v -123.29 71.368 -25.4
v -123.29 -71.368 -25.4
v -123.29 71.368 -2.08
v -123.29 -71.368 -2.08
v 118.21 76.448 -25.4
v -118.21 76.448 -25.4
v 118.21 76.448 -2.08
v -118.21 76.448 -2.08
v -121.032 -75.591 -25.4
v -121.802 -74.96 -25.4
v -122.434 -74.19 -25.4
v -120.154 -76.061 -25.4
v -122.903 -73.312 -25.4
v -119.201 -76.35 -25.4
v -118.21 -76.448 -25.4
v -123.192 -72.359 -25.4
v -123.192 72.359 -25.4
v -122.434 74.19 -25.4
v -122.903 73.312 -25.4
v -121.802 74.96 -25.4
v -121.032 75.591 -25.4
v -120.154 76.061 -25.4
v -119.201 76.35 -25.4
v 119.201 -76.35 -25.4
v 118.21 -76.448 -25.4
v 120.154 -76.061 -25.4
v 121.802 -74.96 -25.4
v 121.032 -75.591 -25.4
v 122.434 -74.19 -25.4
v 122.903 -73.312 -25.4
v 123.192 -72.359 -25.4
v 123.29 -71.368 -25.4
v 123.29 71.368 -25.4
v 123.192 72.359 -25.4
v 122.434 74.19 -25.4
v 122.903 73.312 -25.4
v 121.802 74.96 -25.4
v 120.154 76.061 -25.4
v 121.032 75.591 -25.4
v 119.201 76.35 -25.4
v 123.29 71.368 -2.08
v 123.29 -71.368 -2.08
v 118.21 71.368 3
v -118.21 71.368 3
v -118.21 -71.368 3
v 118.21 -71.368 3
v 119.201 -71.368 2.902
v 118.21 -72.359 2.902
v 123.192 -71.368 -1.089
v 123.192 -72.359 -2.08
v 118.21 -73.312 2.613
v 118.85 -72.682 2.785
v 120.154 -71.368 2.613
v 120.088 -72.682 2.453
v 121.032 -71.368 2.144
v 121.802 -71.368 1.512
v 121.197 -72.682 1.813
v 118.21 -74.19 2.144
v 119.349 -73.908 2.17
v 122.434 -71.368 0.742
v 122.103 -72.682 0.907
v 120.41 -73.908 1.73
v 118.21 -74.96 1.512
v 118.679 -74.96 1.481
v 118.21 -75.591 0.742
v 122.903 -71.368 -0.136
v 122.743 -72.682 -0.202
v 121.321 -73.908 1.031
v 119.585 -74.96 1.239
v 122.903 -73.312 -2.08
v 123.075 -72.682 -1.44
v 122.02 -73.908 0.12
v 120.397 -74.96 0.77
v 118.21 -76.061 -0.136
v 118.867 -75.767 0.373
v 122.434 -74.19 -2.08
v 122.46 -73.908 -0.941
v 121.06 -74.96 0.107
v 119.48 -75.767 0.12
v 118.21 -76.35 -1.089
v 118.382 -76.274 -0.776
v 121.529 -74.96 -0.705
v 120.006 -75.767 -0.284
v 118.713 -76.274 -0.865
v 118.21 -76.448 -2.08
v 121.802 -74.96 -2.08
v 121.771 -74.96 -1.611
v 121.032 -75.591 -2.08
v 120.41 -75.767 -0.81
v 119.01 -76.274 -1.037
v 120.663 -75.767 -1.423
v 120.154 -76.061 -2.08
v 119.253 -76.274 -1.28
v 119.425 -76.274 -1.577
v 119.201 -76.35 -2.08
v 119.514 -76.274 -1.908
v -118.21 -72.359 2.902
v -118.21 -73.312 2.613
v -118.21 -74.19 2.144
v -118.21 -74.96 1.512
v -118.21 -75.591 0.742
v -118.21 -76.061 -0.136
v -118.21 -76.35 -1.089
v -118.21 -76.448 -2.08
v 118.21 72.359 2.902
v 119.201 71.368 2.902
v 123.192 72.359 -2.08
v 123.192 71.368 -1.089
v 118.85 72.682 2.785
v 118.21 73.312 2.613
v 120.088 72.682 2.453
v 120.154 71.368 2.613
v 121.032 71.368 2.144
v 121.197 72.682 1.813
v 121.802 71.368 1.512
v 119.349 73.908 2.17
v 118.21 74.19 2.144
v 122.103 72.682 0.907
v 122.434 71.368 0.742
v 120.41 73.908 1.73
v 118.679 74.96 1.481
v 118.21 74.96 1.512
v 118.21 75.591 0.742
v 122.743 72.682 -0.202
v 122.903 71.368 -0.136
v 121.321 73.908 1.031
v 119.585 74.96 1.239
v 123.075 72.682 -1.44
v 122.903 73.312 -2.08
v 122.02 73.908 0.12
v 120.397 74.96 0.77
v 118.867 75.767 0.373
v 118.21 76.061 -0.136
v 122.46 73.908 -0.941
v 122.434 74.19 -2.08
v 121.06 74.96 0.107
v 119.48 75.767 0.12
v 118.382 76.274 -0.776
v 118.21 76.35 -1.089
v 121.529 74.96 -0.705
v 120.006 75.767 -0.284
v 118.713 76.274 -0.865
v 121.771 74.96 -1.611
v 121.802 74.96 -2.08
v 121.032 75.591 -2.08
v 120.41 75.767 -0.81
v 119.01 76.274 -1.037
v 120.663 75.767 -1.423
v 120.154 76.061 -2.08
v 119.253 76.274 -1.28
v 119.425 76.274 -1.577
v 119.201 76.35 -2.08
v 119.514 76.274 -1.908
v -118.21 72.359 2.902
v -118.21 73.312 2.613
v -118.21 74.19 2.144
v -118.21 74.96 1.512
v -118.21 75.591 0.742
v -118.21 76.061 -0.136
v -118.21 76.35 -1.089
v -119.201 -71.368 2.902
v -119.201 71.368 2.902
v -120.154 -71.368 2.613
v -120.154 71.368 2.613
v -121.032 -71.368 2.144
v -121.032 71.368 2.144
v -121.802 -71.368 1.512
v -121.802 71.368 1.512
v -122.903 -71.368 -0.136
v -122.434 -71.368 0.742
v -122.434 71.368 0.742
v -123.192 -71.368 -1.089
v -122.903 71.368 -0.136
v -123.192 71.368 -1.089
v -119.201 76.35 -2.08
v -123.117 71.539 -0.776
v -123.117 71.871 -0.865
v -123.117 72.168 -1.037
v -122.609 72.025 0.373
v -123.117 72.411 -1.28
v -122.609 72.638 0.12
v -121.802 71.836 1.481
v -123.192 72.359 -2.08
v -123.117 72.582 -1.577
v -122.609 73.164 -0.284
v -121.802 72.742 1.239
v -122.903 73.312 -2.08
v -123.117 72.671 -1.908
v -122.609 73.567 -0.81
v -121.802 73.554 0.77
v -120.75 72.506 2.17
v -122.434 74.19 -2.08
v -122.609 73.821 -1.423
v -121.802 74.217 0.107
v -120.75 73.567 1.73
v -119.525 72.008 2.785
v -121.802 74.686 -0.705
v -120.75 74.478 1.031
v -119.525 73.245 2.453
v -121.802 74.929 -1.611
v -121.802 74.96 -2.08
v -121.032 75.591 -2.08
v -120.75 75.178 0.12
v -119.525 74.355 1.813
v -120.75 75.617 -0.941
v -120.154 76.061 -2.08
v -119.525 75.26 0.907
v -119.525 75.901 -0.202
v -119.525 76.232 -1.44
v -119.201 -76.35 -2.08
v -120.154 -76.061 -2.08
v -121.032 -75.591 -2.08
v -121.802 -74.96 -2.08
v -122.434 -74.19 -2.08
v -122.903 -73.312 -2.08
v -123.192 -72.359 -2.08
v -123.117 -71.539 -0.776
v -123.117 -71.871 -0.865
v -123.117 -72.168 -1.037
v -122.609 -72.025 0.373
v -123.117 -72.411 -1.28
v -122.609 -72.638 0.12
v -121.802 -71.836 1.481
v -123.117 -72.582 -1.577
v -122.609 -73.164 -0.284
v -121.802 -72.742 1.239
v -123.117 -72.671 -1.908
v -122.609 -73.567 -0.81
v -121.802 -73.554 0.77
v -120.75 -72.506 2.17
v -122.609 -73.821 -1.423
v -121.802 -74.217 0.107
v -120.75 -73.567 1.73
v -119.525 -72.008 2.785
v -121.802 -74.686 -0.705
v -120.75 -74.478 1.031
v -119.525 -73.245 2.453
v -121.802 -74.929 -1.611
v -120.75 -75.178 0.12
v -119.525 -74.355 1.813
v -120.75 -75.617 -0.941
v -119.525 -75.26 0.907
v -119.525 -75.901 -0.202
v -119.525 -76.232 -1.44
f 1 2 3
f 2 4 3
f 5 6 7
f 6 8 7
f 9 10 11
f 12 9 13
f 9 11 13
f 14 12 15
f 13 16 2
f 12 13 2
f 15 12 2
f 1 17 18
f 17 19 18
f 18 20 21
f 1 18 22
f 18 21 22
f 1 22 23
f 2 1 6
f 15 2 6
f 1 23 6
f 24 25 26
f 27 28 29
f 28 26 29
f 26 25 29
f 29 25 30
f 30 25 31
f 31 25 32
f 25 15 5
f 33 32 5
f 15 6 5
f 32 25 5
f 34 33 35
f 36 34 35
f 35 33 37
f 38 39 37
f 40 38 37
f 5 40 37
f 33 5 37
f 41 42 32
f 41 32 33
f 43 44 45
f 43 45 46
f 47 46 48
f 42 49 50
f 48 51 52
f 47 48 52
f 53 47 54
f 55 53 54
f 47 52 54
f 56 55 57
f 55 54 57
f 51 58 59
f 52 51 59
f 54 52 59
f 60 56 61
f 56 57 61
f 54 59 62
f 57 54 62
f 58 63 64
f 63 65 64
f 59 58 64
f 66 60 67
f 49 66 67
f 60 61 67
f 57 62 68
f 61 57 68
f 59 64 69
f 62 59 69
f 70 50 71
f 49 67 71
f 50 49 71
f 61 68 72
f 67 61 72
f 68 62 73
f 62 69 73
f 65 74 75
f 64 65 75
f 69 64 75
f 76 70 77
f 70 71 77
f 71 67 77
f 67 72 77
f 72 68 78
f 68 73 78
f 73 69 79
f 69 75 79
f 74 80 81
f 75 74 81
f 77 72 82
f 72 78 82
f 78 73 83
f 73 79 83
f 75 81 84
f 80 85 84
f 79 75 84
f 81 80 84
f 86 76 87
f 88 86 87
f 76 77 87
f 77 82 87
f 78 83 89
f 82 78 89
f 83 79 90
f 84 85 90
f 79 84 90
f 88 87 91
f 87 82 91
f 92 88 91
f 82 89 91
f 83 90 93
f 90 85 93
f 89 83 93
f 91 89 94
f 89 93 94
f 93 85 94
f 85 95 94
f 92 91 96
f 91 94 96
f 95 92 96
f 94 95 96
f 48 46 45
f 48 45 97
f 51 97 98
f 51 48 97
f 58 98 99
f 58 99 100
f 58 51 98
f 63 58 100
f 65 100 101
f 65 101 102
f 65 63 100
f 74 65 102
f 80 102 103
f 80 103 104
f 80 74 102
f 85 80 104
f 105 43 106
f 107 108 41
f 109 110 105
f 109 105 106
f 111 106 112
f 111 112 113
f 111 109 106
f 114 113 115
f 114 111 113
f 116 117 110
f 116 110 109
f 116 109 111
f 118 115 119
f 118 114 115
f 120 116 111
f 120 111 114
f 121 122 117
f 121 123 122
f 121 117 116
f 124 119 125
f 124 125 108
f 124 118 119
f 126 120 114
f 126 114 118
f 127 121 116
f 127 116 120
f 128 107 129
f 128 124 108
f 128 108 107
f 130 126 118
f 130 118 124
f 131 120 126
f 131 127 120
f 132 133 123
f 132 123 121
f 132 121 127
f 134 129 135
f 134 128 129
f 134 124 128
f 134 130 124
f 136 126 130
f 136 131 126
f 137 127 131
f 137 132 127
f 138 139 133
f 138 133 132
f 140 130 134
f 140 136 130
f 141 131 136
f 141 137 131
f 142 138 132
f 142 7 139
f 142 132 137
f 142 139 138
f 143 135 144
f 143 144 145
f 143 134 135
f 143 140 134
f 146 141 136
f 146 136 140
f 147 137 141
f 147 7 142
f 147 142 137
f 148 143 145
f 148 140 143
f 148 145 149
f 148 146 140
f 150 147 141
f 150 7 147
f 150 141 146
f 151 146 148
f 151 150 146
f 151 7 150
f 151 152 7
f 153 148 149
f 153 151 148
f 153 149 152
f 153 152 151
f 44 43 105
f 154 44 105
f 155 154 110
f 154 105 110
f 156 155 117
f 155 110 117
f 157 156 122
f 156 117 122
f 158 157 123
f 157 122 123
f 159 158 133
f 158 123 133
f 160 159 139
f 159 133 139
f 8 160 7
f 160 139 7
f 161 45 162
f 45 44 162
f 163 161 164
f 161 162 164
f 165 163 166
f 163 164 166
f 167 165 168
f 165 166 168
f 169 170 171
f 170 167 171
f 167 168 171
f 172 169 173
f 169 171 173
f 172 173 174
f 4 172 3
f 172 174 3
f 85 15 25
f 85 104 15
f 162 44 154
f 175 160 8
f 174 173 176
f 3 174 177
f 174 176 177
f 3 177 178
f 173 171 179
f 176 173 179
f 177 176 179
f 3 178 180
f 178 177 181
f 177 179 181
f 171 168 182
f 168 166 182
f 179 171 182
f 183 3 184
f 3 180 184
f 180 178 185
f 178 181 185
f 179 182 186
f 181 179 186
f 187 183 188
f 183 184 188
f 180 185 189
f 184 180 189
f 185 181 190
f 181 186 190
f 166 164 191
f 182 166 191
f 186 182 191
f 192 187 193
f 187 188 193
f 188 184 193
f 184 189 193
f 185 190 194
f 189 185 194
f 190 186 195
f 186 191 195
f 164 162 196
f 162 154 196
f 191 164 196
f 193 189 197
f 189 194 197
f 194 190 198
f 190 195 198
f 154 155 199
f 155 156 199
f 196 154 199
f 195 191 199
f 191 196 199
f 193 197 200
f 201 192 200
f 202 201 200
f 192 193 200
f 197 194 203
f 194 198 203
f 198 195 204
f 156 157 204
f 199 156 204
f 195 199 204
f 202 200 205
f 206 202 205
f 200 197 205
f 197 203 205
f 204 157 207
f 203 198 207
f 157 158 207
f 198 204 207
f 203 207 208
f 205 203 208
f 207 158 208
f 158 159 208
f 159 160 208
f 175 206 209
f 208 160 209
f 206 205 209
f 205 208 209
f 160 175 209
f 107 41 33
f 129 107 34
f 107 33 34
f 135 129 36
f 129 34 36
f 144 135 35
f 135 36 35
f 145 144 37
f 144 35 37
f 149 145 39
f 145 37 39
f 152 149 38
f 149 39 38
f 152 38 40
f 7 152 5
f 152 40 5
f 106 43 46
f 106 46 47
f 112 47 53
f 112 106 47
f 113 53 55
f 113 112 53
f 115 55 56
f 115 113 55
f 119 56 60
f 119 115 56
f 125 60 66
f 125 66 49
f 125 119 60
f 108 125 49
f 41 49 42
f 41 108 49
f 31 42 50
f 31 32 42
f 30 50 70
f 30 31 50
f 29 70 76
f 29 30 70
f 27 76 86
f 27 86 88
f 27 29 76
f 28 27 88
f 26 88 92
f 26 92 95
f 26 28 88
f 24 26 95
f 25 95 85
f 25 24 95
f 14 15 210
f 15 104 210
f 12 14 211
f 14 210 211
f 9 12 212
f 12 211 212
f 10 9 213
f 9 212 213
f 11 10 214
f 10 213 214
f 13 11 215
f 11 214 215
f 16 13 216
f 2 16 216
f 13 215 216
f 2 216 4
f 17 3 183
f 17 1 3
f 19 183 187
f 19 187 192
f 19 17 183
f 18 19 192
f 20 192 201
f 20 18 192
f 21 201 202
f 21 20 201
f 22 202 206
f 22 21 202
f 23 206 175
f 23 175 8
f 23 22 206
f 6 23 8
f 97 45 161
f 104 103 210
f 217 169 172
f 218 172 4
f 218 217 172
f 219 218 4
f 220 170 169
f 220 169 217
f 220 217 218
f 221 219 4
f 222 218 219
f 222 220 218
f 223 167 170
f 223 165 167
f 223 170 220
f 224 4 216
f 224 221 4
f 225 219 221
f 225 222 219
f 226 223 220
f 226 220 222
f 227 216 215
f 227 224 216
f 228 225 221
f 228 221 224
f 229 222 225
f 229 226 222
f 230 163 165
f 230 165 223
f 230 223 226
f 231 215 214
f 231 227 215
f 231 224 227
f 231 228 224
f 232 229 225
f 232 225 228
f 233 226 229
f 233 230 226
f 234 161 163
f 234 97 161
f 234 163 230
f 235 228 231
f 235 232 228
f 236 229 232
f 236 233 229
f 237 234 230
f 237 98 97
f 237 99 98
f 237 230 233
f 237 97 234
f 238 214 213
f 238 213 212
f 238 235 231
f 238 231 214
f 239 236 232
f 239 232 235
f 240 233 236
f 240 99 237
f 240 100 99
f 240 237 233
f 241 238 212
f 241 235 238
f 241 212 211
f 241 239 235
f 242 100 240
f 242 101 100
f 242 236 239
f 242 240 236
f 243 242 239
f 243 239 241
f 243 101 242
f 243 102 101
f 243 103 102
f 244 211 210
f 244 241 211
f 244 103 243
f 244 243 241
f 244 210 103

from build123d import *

# Parameters (mm, degrees)
F0_W          = 246.58002
F0_H          = 152.895108
F1_DEPTH      = 3
F1_DEPTH_BACK = 25.4
F2_R          = 5.08
F3_R          = 5.08


with BuildPart() as f1:
    # F0 (on Top) → F1 (new body, two sides)
    with BuildSketch(Plane.XY) as f1_sk:
        Rectangle(F0_W, F0_H)
    extrude(amount=F1_DEPTH)
    extrude(f1_sk.sketch, amount=-F1_DEPTH_BACK)

    # F2
    f2_edges = [f1.edges().sort_by_distance(p)[0] for p in [
        (123.29001, 0, 3),
    ]]
    fillet(f2_edges, radius=F2_R)

    # F3
    f3_edges = [f1.edges().sort_by_distance(p)[0] for p in [
        (-2.54, -76.447554, 3),
        (-2.54, 76.447554, 3),
        (-123.29001, 0, 3),
        (123.29001, -76.447554, -13.74),
        (123.29001, 76.447554, -13.74),
        (-123.29001, -76.447554, -11.2),
        (-123.29001, 76.447554, -11.2),
    ]]
    fillet(f3_edges, radius=F3_R)


solid = f1.part
